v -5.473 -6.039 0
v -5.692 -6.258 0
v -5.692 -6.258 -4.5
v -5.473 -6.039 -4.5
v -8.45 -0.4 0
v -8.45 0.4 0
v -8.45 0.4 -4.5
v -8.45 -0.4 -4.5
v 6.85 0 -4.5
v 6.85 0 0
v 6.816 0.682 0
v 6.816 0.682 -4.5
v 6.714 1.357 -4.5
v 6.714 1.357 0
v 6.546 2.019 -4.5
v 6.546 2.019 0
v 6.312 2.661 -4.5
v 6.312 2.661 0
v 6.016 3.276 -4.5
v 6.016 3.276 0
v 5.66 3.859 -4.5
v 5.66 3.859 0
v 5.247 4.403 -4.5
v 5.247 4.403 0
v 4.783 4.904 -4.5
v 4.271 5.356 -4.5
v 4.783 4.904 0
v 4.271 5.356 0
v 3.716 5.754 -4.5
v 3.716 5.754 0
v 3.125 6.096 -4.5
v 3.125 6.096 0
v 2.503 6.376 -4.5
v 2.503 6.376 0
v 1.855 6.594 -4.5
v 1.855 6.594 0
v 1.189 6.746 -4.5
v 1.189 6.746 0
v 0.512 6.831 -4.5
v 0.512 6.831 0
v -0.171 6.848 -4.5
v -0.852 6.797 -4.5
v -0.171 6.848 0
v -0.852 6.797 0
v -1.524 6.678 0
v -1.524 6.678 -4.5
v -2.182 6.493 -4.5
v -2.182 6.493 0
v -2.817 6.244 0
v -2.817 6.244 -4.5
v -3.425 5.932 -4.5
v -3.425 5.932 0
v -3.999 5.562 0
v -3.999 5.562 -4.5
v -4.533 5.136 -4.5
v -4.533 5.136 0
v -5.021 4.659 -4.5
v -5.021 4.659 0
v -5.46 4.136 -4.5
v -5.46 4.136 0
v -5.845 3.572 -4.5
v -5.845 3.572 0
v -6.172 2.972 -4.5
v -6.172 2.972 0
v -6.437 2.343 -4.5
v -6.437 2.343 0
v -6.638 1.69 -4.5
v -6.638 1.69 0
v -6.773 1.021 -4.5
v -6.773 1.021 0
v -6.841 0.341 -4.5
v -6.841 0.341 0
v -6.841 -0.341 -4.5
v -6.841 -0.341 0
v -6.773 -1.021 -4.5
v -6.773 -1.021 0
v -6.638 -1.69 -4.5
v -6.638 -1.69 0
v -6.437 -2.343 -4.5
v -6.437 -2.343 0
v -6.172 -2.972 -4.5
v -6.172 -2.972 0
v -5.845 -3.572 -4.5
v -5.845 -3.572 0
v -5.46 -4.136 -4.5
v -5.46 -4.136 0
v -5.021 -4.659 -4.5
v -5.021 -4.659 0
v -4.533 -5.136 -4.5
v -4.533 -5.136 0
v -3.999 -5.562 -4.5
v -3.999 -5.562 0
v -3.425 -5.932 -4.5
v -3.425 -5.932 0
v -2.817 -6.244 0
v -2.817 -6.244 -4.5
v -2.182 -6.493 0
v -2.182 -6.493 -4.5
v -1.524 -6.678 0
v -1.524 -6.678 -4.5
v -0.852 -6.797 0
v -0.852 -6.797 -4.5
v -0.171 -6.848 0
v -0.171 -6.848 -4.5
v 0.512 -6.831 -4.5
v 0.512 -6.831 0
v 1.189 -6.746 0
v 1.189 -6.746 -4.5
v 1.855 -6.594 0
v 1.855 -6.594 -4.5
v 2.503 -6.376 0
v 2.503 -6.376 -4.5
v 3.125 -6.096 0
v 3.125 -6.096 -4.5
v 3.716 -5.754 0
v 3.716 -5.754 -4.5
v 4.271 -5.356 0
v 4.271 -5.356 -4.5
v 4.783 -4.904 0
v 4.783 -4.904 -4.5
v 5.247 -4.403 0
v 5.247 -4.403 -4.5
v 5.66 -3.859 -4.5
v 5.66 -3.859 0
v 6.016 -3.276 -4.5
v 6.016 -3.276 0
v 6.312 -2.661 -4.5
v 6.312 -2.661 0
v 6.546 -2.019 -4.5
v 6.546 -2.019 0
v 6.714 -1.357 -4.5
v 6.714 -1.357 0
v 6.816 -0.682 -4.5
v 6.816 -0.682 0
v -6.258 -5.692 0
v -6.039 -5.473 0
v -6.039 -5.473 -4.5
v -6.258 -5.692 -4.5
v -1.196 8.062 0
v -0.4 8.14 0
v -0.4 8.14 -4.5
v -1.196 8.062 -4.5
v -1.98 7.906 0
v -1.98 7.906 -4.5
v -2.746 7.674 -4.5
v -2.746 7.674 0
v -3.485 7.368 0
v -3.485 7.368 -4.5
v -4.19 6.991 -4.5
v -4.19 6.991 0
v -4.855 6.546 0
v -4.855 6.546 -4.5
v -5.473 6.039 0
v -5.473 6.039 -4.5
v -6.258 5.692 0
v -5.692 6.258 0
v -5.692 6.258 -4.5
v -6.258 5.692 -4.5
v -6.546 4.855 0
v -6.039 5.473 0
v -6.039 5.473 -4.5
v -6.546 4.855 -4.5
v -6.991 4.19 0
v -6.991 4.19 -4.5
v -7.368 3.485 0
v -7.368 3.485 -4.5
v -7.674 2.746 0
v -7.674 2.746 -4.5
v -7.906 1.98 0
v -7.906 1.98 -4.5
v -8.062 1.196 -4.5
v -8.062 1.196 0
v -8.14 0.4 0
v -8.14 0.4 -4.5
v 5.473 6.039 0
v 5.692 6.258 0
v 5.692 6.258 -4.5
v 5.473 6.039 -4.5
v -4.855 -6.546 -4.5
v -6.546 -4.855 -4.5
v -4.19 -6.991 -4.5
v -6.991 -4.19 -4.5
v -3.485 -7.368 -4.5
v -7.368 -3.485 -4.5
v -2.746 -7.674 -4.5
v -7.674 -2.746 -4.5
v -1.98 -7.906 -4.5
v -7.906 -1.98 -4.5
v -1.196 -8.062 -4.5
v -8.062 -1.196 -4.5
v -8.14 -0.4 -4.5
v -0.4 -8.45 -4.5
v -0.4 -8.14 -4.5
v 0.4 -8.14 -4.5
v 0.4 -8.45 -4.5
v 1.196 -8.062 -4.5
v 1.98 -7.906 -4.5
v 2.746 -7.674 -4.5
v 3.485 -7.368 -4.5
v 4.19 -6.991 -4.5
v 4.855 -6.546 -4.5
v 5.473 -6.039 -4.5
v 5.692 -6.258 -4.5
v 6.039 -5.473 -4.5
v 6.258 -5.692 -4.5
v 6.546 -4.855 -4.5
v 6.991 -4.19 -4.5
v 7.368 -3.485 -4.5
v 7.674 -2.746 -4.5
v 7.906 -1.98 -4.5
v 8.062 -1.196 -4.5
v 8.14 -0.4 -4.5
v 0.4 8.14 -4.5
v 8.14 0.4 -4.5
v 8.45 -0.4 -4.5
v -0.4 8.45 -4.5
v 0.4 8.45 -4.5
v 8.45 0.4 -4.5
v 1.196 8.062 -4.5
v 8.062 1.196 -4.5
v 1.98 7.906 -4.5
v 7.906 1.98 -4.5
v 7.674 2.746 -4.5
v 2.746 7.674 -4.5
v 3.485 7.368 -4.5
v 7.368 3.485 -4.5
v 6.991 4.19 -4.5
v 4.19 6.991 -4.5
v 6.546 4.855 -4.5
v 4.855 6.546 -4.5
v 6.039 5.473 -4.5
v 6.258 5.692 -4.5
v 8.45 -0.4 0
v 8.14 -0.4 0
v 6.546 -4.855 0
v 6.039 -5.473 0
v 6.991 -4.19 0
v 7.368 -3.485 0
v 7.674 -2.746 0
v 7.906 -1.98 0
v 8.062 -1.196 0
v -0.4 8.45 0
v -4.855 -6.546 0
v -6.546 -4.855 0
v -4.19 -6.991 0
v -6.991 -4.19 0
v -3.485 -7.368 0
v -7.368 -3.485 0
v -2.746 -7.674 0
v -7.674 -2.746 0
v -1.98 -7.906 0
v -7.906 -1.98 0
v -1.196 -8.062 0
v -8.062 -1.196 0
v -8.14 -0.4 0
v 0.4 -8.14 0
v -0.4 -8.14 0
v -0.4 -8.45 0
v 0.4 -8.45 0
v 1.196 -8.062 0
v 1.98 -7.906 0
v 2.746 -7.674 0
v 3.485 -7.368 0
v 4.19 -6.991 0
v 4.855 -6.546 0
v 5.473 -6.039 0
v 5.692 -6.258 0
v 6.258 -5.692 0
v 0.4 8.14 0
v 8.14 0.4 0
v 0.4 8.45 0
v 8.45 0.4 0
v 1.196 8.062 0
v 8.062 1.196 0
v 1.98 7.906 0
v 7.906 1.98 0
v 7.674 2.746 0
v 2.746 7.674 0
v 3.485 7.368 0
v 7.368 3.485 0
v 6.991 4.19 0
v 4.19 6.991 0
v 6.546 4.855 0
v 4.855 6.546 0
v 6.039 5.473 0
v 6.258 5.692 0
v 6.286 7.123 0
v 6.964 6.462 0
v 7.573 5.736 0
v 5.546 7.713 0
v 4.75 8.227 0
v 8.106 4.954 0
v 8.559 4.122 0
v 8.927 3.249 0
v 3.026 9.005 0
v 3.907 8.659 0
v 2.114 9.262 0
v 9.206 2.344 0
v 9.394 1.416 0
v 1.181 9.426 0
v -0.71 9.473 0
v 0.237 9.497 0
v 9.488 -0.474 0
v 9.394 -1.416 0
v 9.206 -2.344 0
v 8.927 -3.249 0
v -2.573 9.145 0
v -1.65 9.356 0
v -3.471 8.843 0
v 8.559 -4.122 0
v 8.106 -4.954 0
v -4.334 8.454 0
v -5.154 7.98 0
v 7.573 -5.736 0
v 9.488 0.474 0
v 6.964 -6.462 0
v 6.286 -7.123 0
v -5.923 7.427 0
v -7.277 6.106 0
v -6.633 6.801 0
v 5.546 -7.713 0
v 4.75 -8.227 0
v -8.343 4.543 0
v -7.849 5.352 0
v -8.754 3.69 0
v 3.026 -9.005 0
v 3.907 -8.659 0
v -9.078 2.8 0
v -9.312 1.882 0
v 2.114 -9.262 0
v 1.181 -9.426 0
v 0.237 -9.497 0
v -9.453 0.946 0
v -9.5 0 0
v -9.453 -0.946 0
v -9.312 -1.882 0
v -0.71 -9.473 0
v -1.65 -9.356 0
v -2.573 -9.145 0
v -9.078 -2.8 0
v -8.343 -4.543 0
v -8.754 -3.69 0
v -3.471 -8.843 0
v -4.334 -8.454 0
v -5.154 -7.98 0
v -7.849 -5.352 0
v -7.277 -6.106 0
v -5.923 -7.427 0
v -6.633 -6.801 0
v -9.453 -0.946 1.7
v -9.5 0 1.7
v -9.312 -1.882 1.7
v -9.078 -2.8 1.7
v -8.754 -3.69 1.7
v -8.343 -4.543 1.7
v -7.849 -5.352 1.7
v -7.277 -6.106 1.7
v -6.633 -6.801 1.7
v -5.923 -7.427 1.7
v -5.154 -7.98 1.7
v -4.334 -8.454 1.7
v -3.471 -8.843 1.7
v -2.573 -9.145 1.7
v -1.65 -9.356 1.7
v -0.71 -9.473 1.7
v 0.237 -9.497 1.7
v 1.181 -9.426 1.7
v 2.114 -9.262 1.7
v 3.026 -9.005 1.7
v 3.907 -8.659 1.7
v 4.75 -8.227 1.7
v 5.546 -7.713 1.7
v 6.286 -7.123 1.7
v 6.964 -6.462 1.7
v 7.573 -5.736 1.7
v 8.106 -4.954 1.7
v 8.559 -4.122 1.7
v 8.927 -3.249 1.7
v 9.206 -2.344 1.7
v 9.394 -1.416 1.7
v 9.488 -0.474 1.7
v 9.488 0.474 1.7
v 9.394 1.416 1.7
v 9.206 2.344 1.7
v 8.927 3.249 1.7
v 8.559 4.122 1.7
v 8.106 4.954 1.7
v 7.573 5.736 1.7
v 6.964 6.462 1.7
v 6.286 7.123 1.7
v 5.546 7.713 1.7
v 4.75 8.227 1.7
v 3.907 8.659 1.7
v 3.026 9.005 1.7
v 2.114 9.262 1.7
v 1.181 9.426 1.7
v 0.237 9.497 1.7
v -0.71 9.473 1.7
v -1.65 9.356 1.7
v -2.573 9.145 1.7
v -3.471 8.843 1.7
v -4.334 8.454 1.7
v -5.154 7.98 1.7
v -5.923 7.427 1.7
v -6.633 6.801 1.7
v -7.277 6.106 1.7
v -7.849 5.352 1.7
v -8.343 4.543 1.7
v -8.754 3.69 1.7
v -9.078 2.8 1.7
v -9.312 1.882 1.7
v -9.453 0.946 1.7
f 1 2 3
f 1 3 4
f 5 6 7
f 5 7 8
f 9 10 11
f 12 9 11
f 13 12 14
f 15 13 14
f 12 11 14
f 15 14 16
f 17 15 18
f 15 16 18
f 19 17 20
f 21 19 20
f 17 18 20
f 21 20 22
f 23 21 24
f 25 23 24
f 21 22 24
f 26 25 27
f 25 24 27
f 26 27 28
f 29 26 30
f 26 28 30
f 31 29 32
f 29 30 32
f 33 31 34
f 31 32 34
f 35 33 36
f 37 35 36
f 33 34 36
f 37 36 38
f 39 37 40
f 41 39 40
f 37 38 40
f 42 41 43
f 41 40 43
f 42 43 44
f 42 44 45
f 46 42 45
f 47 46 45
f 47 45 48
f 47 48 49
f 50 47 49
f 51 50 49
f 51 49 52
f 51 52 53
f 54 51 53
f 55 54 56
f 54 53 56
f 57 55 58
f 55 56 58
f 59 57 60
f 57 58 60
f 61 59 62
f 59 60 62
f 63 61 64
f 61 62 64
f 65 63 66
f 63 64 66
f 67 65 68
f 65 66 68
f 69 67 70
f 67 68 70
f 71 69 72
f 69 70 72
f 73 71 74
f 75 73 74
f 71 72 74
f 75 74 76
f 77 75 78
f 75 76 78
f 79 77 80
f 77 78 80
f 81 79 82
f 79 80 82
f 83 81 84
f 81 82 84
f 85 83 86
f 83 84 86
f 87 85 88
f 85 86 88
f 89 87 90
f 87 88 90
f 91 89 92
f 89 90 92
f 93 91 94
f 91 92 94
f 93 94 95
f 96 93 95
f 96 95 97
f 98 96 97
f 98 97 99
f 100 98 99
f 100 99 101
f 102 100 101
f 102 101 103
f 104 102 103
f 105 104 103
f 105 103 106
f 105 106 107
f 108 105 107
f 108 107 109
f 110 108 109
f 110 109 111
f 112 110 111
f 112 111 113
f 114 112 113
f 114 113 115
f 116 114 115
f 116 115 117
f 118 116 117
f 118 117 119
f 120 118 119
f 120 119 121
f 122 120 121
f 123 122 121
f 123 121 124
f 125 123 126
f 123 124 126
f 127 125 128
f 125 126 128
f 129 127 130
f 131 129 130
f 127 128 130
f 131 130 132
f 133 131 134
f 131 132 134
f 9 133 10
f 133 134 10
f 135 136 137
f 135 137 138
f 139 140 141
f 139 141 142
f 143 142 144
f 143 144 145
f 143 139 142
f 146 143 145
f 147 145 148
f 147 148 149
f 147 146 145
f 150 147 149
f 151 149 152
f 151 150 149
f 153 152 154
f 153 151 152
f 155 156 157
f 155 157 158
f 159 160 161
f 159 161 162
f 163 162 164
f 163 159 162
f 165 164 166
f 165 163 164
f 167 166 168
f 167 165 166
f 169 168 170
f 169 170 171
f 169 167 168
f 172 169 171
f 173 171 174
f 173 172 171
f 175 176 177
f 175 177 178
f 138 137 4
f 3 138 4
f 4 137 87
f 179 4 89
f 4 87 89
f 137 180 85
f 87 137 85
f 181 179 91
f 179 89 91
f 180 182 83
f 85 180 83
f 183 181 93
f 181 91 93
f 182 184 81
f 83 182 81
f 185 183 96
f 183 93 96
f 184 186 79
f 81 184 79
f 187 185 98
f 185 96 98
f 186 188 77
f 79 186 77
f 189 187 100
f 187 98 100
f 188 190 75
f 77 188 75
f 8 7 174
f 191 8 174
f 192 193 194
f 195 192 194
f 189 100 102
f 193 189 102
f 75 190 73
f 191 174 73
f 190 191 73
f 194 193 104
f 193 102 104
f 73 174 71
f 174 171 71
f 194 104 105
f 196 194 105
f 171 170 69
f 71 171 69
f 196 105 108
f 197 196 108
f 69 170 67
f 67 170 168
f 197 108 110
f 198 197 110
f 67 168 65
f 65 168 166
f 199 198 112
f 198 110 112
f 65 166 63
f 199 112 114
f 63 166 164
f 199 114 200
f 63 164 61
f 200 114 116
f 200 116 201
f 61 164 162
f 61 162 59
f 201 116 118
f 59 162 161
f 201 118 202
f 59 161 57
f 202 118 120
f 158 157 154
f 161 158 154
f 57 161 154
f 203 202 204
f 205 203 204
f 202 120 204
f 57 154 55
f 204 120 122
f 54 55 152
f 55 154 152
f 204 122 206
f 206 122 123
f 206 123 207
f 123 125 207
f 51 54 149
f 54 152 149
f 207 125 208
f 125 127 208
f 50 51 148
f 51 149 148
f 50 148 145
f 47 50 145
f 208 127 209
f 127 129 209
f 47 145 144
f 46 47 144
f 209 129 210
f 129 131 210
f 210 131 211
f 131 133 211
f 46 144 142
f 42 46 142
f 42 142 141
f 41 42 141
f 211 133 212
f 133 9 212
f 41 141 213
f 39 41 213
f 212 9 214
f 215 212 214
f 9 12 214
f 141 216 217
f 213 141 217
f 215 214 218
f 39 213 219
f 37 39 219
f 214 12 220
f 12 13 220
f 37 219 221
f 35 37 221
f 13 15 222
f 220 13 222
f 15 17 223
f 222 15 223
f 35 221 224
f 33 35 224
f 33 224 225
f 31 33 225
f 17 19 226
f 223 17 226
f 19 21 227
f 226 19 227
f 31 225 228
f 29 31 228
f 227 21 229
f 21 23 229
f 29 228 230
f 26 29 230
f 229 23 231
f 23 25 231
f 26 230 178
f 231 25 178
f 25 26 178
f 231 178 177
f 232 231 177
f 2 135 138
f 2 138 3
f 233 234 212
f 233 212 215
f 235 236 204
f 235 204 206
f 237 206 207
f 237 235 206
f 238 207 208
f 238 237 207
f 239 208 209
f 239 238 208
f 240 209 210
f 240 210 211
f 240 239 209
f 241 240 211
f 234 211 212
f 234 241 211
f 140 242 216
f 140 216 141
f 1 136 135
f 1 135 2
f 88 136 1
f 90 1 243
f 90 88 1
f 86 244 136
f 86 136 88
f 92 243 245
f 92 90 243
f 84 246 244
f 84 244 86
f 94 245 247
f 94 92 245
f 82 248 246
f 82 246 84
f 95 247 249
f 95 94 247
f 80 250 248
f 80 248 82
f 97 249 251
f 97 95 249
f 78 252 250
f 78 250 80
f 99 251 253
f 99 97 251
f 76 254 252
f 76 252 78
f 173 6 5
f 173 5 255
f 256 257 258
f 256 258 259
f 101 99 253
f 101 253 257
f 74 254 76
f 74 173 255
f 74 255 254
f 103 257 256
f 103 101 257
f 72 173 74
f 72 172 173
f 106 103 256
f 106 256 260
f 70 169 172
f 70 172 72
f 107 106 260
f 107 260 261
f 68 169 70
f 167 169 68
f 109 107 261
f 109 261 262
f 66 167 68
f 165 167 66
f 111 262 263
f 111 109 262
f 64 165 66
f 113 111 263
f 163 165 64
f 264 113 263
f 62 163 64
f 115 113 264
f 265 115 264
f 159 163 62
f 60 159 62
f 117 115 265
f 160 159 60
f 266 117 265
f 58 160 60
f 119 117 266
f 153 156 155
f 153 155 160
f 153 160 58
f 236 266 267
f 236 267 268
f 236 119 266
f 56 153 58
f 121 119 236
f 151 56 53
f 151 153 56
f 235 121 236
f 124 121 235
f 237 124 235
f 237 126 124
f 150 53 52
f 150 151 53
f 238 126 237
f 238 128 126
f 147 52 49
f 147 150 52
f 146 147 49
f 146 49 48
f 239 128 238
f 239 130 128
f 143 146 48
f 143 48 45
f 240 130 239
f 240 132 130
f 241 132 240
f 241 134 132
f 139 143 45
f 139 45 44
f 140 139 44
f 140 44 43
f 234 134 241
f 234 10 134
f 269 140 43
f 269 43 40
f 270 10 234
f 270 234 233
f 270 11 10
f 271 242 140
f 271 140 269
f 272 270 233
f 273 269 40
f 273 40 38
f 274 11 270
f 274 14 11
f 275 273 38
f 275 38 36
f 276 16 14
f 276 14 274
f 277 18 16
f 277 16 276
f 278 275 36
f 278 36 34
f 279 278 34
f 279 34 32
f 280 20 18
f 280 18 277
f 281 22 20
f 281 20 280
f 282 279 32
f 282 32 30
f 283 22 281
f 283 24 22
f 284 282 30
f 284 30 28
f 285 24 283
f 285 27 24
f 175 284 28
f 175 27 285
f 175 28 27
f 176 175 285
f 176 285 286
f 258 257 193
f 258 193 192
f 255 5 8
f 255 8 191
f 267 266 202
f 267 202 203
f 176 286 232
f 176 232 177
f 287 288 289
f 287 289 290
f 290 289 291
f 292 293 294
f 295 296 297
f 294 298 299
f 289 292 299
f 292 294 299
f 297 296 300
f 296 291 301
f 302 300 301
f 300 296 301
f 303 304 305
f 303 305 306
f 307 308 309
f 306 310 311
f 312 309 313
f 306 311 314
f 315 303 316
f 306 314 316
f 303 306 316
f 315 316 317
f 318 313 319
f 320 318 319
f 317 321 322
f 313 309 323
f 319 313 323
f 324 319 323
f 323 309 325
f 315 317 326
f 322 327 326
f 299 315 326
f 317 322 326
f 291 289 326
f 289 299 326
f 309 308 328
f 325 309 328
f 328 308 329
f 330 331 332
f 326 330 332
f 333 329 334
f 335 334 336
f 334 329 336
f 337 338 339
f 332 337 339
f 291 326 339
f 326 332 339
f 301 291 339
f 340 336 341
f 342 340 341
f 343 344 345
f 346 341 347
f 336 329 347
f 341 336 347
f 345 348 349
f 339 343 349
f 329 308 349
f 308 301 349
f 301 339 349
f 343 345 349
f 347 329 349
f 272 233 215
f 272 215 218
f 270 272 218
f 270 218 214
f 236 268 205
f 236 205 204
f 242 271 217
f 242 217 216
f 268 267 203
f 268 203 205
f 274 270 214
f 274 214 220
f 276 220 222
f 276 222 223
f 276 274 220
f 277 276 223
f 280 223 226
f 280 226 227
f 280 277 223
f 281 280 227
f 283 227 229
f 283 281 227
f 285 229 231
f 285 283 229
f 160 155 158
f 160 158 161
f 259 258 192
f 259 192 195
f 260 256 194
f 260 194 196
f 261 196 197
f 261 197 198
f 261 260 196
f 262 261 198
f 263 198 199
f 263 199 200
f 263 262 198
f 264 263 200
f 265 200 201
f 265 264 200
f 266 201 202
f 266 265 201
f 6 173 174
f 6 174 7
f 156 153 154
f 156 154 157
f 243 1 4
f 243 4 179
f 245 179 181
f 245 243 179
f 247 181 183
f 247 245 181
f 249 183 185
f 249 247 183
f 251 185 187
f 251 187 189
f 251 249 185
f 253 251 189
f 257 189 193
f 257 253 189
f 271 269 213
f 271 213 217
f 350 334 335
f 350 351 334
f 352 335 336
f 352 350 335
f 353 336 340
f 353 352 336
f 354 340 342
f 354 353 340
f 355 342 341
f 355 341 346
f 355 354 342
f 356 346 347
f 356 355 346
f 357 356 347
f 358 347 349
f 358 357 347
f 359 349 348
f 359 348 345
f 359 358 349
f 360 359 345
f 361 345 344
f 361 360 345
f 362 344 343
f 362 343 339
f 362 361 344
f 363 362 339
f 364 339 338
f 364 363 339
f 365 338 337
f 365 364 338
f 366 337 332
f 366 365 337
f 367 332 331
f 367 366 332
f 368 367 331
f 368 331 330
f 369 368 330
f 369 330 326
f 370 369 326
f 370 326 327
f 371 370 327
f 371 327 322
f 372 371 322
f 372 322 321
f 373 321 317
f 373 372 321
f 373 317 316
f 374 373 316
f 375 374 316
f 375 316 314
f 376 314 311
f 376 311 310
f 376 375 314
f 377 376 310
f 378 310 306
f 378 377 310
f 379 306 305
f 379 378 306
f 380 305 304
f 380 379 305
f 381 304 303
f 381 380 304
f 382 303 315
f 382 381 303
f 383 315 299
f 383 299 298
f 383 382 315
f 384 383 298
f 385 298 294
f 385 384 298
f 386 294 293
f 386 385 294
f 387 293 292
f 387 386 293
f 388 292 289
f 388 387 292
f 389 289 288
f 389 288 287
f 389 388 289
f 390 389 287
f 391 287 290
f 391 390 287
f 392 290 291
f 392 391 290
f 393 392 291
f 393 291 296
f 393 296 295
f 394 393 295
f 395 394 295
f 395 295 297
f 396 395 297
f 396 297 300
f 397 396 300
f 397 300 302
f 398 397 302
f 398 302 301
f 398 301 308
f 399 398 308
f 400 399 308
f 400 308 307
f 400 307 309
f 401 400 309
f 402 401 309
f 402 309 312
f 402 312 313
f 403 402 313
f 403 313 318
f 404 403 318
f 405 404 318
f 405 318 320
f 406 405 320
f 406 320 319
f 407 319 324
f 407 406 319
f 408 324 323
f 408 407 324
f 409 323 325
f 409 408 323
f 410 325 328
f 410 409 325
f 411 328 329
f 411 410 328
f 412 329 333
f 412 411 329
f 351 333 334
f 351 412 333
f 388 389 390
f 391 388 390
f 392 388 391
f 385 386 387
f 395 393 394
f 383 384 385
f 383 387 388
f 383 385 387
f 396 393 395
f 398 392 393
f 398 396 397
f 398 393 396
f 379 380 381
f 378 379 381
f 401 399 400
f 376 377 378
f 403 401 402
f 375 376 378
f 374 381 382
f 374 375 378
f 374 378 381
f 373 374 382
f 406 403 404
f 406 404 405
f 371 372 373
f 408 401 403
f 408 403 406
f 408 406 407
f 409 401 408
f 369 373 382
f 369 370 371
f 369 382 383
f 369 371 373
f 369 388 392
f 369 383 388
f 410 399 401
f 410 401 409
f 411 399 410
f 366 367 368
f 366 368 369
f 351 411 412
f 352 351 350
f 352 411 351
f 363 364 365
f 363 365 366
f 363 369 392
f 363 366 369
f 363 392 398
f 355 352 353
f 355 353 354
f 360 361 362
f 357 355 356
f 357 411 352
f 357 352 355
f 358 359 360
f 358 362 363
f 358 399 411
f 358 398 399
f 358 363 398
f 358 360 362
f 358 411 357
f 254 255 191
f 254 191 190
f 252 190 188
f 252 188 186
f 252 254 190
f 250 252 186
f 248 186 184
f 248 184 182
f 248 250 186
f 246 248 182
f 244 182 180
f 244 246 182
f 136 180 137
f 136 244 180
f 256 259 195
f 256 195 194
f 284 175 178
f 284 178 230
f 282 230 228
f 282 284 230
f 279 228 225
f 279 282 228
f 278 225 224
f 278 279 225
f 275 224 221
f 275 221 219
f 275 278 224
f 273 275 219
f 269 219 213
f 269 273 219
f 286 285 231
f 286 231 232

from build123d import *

# Parameters (mm, degrees)
F0_R     = 6.85
F1_DEPTH = 4.5
F2_W     = 9.5
F2_H     = 1.7
F3_ANGLE = 180


# Not quite as in the source:
# - a feature names something its author has since deleted; it is built from what else it names


with BuildPart() as f1:
    # F0 (on Top) → F1 (new body)
    with BuildSketch(Plane.XY):
        with BuildLine():
            Line((-0.4, 8.45), (-0.4, 8.1401781307))
            ThreePointArc((-0.4, 8.1401781307), (-3.1188699738, 7.52961819), (-5.4731324438, 6.0388178688))
            Line((-5.4731324438, 6.0388178688), (-5.6922095886, 6.2578950135))
            Line((-5.6922095886, 6.2578950135), (-6.2578950135, 5.6922095886))
            Line((-6.2578950135, 5.6922095886), (-6.0388178688, 5.4731324438))
            ThreePointArc((-6.0388178688, 5.4731324438), (-7.52961819, 3.1188699738), (-8.1401781307, 0.4))
            Line((-8.1401781307, 0.4), (-8.45, 0.4))
            Line((-8.45, 0.4), (-8.45, -0.4))
            Line((-8.45, -0.4), (-8.1401781307, -0.4))
            ThreePointArc((-8.1401781307, -0.4), (-7.52961819, -3.1188699738), (-6.0388178688, -5.4731324438))
            Line((-6.0388178688, -5.4731324438), (-6.2578950135, -5.6922095886))
            Line((-6.2578950135, -5.6922095886), (-5.6922095886, -6.2578950135))
            Line((-5.6922095886, -6.2578950135), (-5.4731324438, -6.0388178688))
            ThreePointArc((-5.4731324438, -6.0388178688), (-3.1188699738, -7.52961819), (-0.4, -8.1401781307))
            Line((-0.4, -8.1401781307), (-0.4, -8.45))
            Line((-0.4, -8.45), (0.4, -8.45))
            Line((0.4, -8.45), (0.4, -8.1401781307))
            ThreePointArc((0.4, -8.1401781307), (3.1188699738, -7.52961819), (5.4731324438, -6.0388178688))
            Line((5.4731324438, -6.0388178688), (5.6922095886, -6.2578950135))
            Line((5.6922095886, -6.2578950135), (6.2578950135, -5.6922095886))
            Line((6.2578950135, -5.6922095886), (6.0388178688, -5.4731324438))
            ThreePointArc((6.0388178688, -5.4731324438), (7.52961819, -3.1188699738), (8.1401781307, -0.4))
            Line((8.1401781307, -0.4), (8.45, -0.4))
            Line((8.45, -0.4), (8.45, 0.4))
            Line((8.45, 0.4), (8.1401781307, 0.4))
            ThreePointArc((8.1401781307, 0.4), (7.52961819, 3.1188699738), (6.0388178688, 5.4731324438))
            Line((6.0388178688, 5.4731324438), (6.2578950135, 5.6922095886))
            Line((6.2578950135, 5.6922095886), (5.6922095886, 6.2578950135))
            Line((5.6922095886, 6.2578950135), (5.4731324438, 6.0388178688))
            ThreePointArc((5.4731324438, 6.0388178688), (3.1188699738, 7.52961819), (0.4, 8.1401781307))
            Line((0.4, 8.1401781307), (0.4, 8.45))
            Line((0.4, 8.45), (-0.4, 8.45))
        make_face()
        Circle(F0_R, mode=Mode.SUBTRACT)
    extrude(amount=-F1_DEPTH)


with BuildPart() as f3:
    # F2 (on Front) → F3 (revolve)
    with BuildSketch(Plane.XZ):
        with Locations((-4.75, 0.85)):
            Rectangle(F2_W, F2_H)
    revolve(axis=Axis((0, 0, 0.85), (0, 0, 1)), revolution_arc=F3_ANGLE)


with BuildPart() as f4:
    # F2 (on Front) → F4 (revolve)
    with BuildSketch(Plane.XZ):
        with Locations((-4.75, 0.85)):
            Rectangle(F2_W, F2_H)
    revolve(axis=Axis((0, 0, 0.85), (0, 0, 1)))


solid = Compound([f1.part, f4.part])
